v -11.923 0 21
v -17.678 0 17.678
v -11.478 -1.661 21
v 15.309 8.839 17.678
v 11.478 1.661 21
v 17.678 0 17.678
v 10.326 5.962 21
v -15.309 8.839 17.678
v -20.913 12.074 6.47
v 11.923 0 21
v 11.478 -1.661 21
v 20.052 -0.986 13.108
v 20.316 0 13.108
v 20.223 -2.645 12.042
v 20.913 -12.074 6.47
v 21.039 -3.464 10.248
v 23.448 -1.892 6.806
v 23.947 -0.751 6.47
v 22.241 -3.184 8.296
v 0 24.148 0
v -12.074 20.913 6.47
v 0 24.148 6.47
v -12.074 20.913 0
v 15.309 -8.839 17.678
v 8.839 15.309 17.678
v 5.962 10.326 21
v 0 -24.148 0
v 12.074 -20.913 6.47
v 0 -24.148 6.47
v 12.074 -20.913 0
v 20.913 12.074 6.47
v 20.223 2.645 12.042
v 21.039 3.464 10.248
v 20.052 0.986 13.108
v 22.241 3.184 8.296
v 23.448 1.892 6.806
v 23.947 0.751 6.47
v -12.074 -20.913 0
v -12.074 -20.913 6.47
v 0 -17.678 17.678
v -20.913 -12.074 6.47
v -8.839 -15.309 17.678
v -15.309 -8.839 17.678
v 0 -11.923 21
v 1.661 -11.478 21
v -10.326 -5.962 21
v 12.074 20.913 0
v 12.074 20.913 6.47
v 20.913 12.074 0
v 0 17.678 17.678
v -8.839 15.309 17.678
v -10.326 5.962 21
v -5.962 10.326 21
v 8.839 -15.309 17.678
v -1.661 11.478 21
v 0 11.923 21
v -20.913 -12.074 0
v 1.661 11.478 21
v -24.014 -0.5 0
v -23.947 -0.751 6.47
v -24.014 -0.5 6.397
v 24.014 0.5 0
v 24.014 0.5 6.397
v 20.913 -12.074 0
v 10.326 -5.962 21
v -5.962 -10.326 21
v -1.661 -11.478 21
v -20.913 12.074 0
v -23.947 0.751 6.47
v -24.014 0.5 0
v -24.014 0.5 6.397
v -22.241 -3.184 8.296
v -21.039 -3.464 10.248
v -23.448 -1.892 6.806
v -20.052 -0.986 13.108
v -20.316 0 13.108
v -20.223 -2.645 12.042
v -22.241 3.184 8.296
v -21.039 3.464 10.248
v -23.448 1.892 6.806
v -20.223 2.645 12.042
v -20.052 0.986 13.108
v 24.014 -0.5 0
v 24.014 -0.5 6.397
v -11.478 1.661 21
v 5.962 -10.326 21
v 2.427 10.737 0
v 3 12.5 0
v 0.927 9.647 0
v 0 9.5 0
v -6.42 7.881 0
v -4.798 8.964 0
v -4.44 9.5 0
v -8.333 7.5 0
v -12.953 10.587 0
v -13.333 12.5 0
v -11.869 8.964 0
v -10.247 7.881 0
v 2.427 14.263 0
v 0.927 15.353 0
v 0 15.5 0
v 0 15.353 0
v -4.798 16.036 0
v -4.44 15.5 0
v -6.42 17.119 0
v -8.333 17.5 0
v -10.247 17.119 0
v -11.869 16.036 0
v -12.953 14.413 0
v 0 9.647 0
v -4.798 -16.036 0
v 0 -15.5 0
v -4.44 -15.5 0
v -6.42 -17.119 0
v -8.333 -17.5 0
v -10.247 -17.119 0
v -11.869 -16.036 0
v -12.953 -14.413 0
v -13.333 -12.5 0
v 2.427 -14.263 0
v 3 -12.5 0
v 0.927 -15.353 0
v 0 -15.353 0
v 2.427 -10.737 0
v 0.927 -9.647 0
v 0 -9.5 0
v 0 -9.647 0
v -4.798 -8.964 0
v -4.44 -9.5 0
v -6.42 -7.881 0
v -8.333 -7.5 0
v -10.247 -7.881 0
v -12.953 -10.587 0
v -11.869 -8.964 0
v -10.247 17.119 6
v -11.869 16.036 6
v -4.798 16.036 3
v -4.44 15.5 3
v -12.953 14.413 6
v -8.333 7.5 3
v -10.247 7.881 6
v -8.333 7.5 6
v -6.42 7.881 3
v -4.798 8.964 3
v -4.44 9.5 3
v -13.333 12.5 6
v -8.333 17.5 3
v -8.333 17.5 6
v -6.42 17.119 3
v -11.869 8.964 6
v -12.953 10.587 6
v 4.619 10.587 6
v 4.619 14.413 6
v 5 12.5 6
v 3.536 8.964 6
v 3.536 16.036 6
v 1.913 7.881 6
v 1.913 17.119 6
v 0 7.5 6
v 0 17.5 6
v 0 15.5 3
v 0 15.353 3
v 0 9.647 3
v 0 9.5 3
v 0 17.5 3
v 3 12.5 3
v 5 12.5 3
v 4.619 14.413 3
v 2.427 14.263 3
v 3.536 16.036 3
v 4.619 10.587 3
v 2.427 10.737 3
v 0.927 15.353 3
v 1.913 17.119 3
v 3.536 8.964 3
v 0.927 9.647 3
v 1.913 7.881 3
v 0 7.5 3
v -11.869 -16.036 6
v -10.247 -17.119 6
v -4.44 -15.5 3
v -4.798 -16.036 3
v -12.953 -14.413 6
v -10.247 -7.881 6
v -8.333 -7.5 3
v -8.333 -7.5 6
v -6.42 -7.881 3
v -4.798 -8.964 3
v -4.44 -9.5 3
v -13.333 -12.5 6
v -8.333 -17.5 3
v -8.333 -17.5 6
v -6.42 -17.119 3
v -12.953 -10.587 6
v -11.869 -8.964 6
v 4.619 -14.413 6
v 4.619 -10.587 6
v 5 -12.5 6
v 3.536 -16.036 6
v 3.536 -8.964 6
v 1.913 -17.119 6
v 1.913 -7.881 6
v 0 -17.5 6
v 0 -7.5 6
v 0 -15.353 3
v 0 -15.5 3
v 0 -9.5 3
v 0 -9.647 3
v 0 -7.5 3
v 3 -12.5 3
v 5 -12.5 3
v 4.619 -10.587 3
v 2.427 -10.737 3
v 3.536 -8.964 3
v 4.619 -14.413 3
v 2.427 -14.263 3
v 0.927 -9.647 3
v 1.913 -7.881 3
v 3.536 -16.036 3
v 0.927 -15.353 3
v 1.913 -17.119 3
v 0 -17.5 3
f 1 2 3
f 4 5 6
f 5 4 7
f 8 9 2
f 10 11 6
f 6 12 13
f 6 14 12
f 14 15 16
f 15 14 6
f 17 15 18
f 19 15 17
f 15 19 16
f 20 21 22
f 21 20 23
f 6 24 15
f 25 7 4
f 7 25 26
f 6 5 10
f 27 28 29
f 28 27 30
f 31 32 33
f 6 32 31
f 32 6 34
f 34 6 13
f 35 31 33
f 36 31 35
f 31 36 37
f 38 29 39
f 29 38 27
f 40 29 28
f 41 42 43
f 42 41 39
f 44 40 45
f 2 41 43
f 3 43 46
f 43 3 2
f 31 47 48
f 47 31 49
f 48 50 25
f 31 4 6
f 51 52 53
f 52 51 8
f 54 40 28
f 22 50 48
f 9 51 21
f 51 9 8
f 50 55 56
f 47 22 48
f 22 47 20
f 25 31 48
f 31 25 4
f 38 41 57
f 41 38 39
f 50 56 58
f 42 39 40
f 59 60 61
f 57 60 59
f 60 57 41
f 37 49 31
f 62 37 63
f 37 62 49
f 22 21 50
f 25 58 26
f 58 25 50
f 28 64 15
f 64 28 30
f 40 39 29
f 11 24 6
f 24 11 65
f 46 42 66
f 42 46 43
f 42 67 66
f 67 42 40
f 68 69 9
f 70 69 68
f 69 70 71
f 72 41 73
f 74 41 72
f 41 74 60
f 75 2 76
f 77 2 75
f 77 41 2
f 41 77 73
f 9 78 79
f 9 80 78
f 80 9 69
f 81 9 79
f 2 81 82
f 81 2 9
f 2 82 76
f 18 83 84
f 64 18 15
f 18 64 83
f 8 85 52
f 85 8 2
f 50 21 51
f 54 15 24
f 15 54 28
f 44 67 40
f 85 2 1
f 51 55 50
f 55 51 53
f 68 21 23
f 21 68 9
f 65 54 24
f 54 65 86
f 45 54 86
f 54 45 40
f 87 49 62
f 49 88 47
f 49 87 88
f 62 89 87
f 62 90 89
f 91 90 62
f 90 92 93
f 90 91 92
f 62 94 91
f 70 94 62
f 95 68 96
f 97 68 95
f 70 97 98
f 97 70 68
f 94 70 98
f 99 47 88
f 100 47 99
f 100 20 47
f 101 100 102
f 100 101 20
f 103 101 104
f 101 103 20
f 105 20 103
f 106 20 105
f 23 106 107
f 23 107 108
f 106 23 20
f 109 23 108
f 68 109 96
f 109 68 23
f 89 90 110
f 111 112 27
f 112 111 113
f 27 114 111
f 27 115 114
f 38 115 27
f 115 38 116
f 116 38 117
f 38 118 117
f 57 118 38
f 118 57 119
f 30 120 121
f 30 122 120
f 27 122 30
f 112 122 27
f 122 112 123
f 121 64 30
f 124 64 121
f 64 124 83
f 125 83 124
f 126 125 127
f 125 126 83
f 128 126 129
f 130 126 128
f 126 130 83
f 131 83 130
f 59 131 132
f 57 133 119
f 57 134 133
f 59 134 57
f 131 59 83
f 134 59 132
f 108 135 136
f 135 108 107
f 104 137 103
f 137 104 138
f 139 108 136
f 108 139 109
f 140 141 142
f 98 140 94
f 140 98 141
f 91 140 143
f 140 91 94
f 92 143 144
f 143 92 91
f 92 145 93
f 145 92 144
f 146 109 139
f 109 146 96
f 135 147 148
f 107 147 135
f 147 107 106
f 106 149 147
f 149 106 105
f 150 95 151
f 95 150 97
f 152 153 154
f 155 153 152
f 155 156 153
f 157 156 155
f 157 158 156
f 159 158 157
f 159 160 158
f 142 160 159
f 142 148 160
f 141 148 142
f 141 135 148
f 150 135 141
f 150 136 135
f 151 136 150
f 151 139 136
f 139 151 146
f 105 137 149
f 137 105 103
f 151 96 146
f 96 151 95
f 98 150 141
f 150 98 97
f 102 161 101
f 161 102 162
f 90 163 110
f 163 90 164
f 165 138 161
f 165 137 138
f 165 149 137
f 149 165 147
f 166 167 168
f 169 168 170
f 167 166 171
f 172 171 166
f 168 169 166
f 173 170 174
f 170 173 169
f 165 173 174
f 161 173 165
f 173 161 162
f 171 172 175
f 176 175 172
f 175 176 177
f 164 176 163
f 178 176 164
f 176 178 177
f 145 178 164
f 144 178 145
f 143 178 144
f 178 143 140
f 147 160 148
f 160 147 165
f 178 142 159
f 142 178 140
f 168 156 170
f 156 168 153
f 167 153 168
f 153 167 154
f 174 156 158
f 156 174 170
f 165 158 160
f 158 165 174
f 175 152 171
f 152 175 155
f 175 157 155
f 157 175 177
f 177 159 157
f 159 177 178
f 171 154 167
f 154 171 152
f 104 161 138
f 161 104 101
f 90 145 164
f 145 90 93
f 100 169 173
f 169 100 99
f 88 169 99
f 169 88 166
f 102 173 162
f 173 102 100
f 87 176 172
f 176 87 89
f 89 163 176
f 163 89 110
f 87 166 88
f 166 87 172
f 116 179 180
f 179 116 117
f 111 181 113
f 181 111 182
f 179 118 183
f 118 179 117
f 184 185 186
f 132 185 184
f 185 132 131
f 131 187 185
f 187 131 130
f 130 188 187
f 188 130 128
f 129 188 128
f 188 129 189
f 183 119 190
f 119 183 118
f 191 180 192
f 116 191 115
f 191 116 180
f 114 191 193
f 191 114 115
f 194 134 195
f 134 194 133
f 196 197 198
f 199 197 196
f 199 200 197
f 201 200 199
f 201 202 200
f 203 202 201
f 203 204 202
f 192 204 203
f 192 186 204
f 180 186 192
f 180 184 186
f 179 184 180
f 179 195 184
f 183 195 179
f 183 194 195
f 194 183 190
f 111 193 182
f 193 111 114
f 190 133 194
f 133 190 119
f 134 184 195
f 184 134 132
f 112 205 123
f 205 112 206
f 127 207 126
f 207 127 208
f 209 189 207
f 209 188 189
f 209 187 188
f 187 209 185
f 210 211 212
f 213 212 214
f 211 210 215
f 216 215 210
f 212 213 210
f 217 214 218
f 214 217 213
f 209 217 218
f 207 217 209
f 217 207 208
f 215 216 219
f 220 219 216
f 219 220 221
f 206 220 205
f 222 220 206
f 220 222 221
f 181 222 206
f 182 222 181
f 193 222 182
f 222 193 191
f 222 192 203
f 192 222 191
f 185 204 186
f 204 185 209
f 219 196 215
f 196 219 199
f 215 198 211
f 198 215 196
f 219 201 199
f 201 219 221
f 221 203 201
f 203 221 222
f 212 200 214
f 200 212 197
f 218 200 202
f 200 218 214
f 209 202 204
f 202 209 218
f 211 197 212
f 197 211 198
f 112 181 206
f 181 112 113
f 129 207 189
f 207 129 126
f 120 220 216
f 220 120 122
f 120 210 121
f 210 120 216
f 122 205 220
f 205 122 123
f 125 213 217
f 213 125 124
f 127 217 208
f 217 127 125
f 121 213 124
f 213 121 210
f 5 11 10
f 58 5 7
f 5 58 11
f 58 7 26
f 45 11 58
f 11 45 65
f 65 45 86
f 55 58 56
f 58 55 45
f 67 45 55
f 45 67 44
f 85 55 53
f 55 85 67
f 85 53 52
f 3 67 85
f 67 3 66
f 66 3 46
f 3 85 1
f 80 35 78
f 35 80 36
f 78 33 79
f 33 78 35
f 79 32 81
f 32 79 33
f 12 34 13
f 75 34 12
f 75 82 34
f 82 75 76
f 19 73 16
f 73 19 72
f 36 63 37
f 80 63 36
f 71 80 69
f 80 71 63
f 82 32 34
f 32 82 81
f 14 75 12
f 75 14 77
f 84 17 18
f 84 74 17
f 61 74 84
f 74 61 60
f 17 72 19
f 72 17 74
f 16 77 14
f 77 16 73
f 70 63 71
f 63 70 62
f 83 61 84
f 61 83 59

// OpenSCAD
// Case Radius (main body radius)
caseRadius = 25;
// Case Quality (number of poligons for case, 10 will be looked like faceted body and 150 will be looked like smooth sphere)
caseQuality = 12; // [10:150]
// Case Hat Face (top will be cutted with this offset, must be relative with Case Radius)
caseHatFace = 4;

// Case Bracing (is screw bracing enabled)
caseBracingEnabled = 1; // [1:Yes, 0:No]
// Radius of Screw for Bracing (rod radius, not a cap radius)
caseBracingScrewRadius = 3;
// Radius of Screw Cap for Bracing (rod radius, not a cap radius)
caseBracingScrewCapRadius = 5;
// Screw Offset from Wall
caseBracingScrewHeight = 3;

// Radius of Wire
wireRadius = 3.5;
// Wire Hole Offset from Center
wireClousereOffset = 1;
// Wire Hole Type (gap - hole with gap at bottom of hole, none - just a hole, latch - part will be splited in two parts, with hole at cutting line)
wireBracingType = "gap"; // [gap, latch, none]

module copy_mirror(vec=[0,1,0]) 
{ 
    children(); 
    mirror(vec) children(); 
}

module copy_translate(vec=[0,1,0]) 
{ 
    children(); 
    translate(vec) children(); 
}

module case (radius, quality, hatFace = 0) {
    module main() {
        difference() {
            sphere(radius, $fn = quality);
            translate([0, 0, -radius]) {
                cube(radius * 2, true);
            }
        }   
    }
    
    module bracing(length, height, screwRadius, screwCapRadius, screwCapHeight) {
        cylinder(height, screwCapRadius, screwCapRadius, false);
        translate([0, -screwCapRadius, height - screwCapHeight]) {
            cube([length, screwCapRadius * 2, screwCapHeight], false);
        }
        translate([length, 0, height - screwCapHeight/2]) { 
            cylinder(screwCapHeight, screwCapRadius, screwCapRadius, true);
        }
        translate([0, -screwRadius, 0]) cube([length, screwRadius * 2, height], false);
        translate([length, 0, 0]) cylinder(height, screwRadius, screwRadius, false);
    }
    
    difference() {
        main(); 
        if (caseBracingEnabled) {
           translate([-radius / 3, 0, 0]) {
            copy_mirror() translate([0, radius / 2, 0]) bracing(radius / 3, caseBracingScrewHeight * 2, caseBracingScrewRadius, caseBracingScrewCapRadius, caseBracingScrewHeight);
        } 
        }
        translate([-radius, -radius, radius - hatFace]) cube(radius * 2, radius * 2, radius * 2);  
    }
}

module wire(radius, caseRadius, offset, withLatch = true, outerLatch = false) {
    latchJoinR = 3;
    
    union() {
        translate([0, 0, caseRadius/2 - radius/2 - offset]) {
            rotate([0, 90 , 0]) {
                cylinder(caseRadius * 2, radius, radius, true);
            }
        }
        
        if (wireBracingType == "gap") {
            cube([caseRadius * 2, 1, (caseRadius/2 - radius/2 - offset) * 2], true);     
        } 
        
        if (withLatch && wireBracingType == "latch") {            
           if (outerLatch) {
              latchJoinR = latchJoinR - 3;
           }
            
           copy_mirror() translate([-caseRadius, 0, caseRadius/2 - radius/2]) {
                rotate([75, 0, 0]) {
                    cube([caseRadius * 2, caseRadius, caseRadius * 2], false);
                    translate([caseRadius, 0, 0]) copy_mirror([1, 0, 0]) translate([-caseRadius * 0.5, 0, caseRadius * 0.4]) rotate([90, 0, 0]) {
                        if (!outerLatch) {
                            cylinder(caseRadius / 4, latchJoinR, latchJoinR); 
                        }
                        if (outerLatch) {
                            cylinder(caseRadius / 4, latchJoinR - 1, latchJoinR - 1); 
                        }
                    }
                }
            }
        }
    }
}

difference() {
    case(caseRadius, caseQuality, caseHatFace);
    wire(wireRadius, caseRadius, wireClousereOffset);
}

if (wireBracingType == "latch") {
   translate([0, 0, caseRadius - caseHatFace]) rotate([180, 0, 0]) translate([caseRadius * 2, 0, 0]) {
     difference() {  
         intersection() {
              case(caseRadius, caseQuality, caseHatFace);
              wire(wireRadius, caseRadius, wireClousereOffset, true, true);
         }  
         wire(wireRadius, caseRadius, wireClousereOffset, false);
     }
   }
}
